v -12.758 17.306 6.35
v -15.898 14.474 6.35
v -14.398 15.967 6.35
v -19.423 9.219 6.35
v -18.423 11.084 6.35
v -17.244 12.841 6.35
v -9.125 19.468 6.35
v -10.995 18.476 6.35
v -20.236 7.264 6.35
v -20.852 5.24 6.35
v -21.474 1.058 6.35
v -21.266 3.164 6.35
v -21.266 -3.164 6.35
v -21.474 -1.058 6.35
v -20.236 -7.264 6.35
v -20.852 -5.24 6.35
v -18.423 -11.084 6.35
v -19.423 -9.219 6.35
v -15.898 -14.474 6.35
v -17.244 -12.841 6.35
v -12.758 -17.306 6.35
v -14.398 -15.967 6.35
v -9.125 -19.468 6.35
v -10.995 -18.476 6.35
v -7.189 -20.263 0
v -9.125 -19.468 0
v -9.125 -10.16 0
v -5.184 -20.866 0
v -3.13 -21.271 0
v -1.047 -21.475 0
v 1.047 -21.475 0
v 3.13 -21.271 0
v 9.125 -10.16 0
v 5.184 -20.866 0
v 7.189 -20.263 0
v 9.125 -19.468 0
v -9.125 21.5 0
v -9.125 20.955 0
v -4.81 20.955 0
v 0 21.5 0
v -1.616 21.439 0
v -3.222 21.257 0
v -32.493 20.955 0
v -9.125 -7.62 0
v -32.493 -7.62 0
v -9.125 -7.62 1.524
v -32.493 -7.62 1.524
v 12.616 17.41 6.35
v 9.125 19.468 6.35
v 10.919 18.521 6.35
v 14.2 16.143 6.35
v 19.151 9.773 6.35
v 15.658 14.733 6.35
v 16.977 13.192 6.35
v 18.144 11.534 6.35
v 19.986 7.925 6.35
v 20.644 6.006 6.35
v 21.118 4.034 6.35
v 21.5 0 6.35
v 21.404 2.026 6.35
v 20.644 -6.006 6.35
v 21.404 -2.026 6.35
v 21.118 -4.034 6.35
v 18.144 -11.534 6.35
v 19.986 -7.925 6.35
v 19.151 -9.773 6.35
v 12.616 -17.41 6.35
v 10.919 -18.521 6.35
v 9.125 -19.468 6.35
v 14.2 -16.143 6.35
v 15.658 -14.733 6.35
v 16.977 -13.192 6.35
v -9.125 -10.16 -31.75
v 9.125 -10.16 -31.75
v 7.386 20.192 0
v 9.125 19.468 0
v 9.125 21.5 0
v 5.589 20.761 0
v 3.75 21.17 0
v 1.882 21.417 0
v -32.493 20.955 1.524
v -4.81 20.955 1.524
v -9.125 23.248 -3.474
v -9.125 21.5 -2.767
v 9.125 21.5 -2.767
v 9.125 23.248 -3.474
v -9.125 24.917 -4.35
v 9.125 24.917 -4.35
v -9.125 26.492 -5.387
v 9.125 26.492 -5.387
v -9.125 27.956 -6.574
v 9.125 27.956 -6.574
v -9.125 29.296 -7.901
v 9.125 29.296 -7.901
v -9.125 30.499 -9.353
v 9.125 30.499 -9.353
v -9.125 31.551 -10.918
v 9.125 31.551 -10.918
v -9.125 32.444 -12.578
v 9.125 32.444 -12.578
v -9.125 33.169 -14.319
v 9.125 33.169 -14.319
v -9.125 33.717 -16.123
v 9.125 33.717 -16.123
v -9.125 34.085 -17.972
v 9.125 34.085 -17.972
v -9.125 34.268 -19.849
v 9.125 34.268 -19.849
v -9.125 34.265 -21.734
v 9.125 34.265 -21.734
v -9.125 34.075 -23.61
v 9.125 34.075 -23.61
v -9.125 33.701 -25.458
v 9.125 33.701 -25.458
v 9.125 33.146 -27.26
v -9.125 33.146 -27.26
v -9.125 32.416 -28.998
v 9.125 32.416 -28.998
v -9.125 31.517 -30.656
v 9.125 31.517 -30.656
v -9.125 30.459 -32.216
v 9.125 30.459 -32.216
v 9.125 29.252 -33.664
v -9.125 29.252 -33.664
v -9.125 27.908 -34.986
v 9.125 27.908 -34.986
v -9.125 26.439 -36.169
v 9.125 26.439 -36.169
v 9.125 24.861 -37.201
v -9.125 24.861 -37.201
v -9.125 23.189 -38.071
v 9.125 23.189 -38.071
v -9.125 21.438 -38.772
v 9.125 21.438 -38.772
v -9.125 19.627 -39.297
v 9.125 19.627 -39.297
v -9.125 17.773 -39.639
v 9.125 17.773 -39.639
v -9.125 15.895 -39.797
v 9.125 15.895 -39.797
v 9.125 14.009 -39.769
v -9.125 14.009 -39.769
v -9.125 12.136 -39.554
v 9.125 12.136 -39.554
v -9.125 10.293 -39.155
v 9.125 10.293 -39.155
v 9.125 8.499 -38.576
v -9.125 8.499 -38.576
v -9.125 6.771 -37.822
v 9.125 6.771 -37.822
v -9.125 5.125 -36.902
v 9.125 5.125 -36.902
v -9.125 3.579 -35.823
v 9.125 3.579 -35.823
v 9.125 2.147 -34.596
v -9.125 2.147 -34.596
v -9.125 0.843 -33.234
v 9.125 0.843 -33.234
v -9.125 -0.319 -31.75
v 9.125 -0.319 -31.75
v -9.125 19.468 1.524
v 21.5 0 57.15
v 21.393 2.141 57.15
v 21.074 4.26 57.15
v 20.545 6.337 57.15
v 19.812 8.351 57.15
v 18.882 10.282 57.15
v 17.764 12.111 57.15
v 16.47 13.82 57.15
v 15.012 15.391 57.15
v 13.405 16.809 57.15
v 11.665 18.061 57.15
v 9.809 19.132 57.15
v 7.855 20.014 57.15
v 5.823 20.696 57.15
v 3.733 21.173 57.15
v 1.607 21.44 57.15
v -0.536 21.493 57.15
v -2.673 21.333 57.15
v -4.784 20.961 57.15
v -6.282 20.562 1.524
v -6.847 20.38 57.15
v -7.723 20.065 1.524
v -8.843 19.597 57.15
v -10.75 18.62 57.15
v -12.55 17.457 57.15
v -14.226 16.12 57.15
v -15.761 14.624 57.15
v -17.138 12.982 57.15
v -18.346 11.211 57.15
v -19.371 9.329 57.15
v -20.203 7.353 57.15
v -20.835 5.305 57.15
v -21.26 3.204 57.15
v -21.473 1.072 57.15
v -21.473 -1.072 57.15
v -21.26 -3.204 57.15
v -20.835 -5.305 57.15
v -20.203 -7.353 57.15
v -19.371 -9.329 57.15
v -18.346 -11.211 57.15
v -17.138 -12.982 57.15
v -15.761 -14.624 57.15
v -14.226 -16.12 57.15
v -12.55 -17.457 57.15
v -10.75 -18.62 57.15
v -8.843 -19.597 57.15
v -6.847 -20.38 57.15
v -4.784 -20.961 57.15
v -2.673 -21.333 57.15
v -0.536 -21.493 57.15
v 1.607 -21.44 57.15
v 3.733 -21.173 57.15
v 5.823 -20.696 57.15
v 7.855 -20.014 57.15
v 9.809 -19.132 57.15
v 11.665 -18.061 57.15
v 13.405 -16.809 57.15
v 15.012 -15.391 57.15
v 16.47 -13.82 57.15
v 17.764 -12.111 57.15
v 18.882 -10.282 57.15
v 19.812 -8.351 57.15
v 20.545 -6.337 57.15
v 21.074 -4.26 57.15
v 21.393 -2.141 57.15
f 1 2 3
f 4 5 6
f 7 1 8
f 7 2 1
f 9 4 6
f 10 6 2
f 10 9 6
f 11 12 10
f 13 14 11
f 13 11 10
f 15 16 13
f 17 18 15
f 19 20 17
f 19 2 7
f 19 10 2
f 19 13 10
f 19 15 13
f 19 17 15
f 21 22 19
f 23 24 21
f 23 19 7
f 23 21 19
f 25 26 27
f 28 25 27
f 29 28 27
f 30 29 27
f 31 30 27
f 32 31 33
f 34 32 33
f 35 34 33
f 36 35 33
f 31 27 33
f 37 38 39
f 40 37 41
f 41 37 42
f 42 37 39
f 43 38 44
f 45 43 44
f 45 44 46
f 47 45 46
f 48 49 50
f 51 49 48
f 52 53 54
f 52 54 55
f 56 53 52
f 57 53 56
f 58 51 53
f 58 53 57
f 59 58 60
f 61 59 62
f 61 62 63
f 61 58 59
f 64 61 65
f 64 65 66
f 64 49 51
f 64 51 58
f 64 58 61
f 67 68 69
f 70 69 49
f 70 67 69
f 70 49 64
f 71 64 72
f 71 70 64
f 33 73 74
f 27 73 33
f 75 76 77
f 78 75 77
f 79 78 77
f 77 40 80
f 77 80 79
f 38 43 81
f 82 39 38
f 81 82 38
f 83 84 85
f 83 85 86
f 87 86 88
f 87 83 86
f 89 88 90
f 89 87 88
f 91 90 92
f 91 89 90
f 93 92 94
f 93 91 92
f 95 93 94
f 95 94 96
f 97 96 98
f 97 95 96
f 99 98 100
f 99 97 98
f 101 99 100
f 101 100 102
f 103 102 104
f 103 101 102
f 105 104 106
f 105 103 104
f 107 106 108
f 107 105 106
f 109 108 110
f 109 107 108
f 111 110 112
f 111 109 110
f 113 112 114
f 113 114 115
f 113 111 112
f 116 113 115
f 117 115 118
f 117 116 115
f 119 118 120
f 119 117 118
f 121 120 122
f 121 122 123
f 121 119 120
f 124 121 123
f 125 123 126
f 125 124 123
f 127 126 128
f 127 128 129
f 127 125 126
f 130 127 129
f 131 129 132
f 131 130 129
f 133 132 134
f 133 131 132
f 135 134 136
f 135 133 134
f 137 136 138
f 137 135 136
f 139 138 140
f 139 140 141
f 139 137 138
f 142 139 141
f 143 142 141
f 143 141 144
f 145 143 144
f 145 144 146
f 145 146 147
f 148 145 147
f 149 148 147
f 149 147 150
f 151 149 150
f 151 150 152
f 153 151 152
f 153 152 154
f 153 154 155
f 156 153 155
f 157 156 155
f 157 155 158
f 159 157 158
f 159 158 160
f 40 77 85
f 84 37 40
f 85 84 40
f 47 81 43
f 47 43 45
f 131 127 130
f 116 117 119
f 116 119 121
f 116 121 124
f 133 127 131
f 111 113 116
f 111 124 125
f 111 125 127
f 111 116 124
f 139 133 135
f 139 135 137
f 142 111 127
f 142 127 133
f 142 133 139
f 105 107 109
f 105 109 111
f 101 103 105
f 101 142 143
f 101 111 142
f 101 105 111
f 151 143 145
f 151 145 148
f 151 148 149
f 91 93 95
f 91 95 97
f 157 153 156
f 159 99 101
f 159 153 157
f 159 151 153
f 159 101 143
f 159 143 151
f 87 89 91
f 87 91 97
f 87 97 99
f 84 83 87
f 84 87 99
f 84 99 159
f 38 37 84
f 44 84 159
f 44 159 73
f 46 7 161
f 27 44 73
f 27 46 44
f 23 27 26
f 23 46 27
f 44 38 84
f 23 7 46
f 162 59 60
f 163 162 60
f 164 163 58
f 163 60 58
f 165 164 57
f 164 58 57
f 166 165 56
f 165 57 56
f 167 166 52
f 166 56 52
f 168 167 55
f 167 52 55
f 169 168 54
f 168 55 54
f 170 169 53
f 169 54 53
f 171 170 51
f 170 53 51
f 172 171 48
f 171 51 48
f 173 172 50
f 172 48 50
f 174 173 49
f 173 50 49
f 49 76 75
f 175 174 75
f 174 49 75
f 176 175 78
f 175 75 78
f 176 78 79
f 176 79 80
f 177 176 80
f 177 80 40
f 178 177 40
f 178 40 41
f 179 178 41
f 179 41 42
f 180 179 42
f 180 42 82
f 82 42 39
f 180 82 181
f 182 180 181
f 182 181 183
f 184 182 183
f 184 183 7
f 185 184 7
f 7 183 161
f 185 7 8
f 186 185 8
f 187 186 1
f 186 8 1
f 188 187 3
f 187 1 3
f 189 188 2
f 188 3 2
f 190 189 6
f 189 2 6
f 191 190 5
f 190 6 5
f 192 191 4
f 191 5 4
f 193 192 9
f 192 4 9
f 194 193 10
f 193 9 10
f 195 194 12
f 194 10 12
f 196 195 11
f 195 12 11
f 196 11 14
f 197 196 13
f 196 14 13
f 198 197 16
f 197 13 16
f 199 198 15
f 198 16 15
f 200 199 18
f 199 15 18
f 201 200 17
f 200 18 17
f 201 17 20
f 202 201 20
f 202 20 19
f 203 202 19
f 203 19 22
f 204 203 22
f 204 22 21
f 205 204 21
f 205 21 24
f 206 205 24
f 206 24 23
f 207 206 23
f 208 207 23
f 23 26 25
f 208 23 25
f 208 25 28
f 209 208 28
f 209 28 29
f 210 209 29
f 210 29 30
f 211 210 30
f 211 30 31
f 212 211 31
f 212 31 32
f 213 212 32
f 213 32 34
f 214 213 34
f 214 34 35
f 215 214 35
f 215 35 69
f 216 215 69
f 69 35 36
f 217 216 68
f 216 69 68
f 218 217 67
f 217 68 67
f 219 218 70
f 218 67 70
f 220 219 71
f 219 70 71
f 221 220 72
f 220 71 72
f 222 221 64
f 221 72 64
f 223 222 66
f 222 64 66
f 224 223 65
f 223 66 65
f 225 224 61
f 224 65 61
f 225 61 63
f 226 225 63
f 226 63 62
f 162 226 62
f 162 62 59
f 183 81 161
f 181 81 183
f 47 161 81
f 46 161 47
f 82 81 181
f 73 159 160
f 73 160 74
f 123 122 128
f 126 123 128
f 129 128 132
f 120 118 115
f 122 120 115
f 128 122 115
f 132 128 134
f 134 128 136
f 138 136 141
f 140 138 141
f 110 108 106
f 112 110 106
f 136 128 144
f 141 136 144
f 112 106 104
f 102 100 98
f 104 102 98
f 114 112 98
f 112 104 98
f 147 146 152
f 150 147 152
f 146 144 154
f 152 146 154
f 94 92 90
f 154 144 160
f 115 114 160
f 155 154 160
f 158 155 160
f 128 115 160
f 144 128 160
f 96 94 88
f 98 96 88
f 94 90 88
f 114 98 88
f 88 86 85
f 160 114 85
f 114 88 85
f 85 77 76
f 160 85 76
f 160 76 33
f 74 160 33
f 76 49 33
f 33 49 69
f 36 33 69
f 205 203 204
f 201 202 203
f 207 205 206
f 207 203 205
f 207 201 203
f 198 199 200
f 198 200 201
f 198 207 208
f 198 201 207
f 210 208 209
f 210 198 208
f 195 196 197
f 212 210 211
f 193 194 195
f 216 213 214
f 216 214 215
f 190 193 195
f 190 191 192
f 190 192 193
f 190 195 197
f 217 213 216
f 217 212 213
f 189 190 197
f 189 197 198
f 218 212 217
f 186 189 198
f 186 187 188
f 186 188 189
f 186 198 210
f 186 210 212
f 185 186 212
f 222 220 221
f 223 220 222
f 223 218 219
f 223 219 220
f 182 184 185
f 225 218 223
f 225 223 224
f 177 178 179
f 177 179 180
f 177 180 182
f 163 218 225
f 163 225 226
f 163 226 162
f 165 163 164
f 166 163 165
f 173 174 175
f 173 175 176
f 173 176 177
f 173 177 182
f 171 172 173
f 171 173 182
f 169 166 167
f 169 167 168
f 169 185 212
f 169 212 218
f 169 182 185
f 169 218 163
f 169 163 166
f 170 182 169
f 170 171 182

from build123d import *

# Parameters (mm, degrees)
F0_R          = 21.5
F1_DEPTH      = 57.15
F2_W          = 17.9596467465
F2_H          = 6.35
F2_W_2        = 17.1457676739
F3_DEPTH      = 21.501
F3_DEPTH_BACK = 21.501
F5_DEPTH      = 18.25
F6_W          = 28.575
F6_H          = 1.524
F7_DEPTH      = 6.35
F7_DEPTH_BACK = 23.368


with BuildPart() as f1:
    # F0 (on Top) → F1 (new body)
    with BuildSketch(Plane.XY):
        Circle(F0_R)
    extrude(amount=F1_DEPTH)

    # F2 (on Front) → F3 (cut, two sides)
    with BuildSketch(Plane.XZ) as f3_sk:
        with Locations((-18.1048233733, 3.175)):
            Rectangle(F2_W, F2_H)
        with Locations((17.6978838369, 3.175)):
            Rectangle(F2_W_2, F2_H)
    extrude(amount=-F3_DEPTH, mode=Mode.SUBTRACT)
    extrude(f3_sk.sketch, amount=F3_DEPTH_BACK, mode=Mode.SUBTRACT)

    # F4 (on face) → F5 (join, through all)
    with BuildSketch(Plane(origin=(-9.125, 0, 0), x_dir=(0, -1, 0), z_dir=(-1, 0, 0))):
        with BuildLine():
            Line((-21.5, 0), (-21.5, -2.7665854228))
            ThreePointArc((-21.5, -2.7665854228), (-30.4593629233, -32.216128711), (0.3193392569, -31.75))
            Line((0.3193392569, -31.75), (10.16, -31.75))
            Line((10.16, -31.75), (10.16, 0))
            Line((10.16, 0), (-19.4675210286, 0))
            Line((-19.4675210286, 0), (-21.5, 0))
        make_face()
    extrude(amount=-F5_DEPTH)

    # F6 (on face) → F7 (join, two sides)
    with BuildSketch(Plane(origin=(-9.125, 0, 0), x_dir=(0, -1, 0), z_dir=(-1, 0, 0))) as f7_sk:
        with Locations((-6.6675, 0.762)):
            Rectangle(F6_W, F6_H)
    extrude(amount=-F7_DEPTH)
    extrude(f7_sk.sketch, amount=F7_DEPTH_BACK)


solid = f1.part
